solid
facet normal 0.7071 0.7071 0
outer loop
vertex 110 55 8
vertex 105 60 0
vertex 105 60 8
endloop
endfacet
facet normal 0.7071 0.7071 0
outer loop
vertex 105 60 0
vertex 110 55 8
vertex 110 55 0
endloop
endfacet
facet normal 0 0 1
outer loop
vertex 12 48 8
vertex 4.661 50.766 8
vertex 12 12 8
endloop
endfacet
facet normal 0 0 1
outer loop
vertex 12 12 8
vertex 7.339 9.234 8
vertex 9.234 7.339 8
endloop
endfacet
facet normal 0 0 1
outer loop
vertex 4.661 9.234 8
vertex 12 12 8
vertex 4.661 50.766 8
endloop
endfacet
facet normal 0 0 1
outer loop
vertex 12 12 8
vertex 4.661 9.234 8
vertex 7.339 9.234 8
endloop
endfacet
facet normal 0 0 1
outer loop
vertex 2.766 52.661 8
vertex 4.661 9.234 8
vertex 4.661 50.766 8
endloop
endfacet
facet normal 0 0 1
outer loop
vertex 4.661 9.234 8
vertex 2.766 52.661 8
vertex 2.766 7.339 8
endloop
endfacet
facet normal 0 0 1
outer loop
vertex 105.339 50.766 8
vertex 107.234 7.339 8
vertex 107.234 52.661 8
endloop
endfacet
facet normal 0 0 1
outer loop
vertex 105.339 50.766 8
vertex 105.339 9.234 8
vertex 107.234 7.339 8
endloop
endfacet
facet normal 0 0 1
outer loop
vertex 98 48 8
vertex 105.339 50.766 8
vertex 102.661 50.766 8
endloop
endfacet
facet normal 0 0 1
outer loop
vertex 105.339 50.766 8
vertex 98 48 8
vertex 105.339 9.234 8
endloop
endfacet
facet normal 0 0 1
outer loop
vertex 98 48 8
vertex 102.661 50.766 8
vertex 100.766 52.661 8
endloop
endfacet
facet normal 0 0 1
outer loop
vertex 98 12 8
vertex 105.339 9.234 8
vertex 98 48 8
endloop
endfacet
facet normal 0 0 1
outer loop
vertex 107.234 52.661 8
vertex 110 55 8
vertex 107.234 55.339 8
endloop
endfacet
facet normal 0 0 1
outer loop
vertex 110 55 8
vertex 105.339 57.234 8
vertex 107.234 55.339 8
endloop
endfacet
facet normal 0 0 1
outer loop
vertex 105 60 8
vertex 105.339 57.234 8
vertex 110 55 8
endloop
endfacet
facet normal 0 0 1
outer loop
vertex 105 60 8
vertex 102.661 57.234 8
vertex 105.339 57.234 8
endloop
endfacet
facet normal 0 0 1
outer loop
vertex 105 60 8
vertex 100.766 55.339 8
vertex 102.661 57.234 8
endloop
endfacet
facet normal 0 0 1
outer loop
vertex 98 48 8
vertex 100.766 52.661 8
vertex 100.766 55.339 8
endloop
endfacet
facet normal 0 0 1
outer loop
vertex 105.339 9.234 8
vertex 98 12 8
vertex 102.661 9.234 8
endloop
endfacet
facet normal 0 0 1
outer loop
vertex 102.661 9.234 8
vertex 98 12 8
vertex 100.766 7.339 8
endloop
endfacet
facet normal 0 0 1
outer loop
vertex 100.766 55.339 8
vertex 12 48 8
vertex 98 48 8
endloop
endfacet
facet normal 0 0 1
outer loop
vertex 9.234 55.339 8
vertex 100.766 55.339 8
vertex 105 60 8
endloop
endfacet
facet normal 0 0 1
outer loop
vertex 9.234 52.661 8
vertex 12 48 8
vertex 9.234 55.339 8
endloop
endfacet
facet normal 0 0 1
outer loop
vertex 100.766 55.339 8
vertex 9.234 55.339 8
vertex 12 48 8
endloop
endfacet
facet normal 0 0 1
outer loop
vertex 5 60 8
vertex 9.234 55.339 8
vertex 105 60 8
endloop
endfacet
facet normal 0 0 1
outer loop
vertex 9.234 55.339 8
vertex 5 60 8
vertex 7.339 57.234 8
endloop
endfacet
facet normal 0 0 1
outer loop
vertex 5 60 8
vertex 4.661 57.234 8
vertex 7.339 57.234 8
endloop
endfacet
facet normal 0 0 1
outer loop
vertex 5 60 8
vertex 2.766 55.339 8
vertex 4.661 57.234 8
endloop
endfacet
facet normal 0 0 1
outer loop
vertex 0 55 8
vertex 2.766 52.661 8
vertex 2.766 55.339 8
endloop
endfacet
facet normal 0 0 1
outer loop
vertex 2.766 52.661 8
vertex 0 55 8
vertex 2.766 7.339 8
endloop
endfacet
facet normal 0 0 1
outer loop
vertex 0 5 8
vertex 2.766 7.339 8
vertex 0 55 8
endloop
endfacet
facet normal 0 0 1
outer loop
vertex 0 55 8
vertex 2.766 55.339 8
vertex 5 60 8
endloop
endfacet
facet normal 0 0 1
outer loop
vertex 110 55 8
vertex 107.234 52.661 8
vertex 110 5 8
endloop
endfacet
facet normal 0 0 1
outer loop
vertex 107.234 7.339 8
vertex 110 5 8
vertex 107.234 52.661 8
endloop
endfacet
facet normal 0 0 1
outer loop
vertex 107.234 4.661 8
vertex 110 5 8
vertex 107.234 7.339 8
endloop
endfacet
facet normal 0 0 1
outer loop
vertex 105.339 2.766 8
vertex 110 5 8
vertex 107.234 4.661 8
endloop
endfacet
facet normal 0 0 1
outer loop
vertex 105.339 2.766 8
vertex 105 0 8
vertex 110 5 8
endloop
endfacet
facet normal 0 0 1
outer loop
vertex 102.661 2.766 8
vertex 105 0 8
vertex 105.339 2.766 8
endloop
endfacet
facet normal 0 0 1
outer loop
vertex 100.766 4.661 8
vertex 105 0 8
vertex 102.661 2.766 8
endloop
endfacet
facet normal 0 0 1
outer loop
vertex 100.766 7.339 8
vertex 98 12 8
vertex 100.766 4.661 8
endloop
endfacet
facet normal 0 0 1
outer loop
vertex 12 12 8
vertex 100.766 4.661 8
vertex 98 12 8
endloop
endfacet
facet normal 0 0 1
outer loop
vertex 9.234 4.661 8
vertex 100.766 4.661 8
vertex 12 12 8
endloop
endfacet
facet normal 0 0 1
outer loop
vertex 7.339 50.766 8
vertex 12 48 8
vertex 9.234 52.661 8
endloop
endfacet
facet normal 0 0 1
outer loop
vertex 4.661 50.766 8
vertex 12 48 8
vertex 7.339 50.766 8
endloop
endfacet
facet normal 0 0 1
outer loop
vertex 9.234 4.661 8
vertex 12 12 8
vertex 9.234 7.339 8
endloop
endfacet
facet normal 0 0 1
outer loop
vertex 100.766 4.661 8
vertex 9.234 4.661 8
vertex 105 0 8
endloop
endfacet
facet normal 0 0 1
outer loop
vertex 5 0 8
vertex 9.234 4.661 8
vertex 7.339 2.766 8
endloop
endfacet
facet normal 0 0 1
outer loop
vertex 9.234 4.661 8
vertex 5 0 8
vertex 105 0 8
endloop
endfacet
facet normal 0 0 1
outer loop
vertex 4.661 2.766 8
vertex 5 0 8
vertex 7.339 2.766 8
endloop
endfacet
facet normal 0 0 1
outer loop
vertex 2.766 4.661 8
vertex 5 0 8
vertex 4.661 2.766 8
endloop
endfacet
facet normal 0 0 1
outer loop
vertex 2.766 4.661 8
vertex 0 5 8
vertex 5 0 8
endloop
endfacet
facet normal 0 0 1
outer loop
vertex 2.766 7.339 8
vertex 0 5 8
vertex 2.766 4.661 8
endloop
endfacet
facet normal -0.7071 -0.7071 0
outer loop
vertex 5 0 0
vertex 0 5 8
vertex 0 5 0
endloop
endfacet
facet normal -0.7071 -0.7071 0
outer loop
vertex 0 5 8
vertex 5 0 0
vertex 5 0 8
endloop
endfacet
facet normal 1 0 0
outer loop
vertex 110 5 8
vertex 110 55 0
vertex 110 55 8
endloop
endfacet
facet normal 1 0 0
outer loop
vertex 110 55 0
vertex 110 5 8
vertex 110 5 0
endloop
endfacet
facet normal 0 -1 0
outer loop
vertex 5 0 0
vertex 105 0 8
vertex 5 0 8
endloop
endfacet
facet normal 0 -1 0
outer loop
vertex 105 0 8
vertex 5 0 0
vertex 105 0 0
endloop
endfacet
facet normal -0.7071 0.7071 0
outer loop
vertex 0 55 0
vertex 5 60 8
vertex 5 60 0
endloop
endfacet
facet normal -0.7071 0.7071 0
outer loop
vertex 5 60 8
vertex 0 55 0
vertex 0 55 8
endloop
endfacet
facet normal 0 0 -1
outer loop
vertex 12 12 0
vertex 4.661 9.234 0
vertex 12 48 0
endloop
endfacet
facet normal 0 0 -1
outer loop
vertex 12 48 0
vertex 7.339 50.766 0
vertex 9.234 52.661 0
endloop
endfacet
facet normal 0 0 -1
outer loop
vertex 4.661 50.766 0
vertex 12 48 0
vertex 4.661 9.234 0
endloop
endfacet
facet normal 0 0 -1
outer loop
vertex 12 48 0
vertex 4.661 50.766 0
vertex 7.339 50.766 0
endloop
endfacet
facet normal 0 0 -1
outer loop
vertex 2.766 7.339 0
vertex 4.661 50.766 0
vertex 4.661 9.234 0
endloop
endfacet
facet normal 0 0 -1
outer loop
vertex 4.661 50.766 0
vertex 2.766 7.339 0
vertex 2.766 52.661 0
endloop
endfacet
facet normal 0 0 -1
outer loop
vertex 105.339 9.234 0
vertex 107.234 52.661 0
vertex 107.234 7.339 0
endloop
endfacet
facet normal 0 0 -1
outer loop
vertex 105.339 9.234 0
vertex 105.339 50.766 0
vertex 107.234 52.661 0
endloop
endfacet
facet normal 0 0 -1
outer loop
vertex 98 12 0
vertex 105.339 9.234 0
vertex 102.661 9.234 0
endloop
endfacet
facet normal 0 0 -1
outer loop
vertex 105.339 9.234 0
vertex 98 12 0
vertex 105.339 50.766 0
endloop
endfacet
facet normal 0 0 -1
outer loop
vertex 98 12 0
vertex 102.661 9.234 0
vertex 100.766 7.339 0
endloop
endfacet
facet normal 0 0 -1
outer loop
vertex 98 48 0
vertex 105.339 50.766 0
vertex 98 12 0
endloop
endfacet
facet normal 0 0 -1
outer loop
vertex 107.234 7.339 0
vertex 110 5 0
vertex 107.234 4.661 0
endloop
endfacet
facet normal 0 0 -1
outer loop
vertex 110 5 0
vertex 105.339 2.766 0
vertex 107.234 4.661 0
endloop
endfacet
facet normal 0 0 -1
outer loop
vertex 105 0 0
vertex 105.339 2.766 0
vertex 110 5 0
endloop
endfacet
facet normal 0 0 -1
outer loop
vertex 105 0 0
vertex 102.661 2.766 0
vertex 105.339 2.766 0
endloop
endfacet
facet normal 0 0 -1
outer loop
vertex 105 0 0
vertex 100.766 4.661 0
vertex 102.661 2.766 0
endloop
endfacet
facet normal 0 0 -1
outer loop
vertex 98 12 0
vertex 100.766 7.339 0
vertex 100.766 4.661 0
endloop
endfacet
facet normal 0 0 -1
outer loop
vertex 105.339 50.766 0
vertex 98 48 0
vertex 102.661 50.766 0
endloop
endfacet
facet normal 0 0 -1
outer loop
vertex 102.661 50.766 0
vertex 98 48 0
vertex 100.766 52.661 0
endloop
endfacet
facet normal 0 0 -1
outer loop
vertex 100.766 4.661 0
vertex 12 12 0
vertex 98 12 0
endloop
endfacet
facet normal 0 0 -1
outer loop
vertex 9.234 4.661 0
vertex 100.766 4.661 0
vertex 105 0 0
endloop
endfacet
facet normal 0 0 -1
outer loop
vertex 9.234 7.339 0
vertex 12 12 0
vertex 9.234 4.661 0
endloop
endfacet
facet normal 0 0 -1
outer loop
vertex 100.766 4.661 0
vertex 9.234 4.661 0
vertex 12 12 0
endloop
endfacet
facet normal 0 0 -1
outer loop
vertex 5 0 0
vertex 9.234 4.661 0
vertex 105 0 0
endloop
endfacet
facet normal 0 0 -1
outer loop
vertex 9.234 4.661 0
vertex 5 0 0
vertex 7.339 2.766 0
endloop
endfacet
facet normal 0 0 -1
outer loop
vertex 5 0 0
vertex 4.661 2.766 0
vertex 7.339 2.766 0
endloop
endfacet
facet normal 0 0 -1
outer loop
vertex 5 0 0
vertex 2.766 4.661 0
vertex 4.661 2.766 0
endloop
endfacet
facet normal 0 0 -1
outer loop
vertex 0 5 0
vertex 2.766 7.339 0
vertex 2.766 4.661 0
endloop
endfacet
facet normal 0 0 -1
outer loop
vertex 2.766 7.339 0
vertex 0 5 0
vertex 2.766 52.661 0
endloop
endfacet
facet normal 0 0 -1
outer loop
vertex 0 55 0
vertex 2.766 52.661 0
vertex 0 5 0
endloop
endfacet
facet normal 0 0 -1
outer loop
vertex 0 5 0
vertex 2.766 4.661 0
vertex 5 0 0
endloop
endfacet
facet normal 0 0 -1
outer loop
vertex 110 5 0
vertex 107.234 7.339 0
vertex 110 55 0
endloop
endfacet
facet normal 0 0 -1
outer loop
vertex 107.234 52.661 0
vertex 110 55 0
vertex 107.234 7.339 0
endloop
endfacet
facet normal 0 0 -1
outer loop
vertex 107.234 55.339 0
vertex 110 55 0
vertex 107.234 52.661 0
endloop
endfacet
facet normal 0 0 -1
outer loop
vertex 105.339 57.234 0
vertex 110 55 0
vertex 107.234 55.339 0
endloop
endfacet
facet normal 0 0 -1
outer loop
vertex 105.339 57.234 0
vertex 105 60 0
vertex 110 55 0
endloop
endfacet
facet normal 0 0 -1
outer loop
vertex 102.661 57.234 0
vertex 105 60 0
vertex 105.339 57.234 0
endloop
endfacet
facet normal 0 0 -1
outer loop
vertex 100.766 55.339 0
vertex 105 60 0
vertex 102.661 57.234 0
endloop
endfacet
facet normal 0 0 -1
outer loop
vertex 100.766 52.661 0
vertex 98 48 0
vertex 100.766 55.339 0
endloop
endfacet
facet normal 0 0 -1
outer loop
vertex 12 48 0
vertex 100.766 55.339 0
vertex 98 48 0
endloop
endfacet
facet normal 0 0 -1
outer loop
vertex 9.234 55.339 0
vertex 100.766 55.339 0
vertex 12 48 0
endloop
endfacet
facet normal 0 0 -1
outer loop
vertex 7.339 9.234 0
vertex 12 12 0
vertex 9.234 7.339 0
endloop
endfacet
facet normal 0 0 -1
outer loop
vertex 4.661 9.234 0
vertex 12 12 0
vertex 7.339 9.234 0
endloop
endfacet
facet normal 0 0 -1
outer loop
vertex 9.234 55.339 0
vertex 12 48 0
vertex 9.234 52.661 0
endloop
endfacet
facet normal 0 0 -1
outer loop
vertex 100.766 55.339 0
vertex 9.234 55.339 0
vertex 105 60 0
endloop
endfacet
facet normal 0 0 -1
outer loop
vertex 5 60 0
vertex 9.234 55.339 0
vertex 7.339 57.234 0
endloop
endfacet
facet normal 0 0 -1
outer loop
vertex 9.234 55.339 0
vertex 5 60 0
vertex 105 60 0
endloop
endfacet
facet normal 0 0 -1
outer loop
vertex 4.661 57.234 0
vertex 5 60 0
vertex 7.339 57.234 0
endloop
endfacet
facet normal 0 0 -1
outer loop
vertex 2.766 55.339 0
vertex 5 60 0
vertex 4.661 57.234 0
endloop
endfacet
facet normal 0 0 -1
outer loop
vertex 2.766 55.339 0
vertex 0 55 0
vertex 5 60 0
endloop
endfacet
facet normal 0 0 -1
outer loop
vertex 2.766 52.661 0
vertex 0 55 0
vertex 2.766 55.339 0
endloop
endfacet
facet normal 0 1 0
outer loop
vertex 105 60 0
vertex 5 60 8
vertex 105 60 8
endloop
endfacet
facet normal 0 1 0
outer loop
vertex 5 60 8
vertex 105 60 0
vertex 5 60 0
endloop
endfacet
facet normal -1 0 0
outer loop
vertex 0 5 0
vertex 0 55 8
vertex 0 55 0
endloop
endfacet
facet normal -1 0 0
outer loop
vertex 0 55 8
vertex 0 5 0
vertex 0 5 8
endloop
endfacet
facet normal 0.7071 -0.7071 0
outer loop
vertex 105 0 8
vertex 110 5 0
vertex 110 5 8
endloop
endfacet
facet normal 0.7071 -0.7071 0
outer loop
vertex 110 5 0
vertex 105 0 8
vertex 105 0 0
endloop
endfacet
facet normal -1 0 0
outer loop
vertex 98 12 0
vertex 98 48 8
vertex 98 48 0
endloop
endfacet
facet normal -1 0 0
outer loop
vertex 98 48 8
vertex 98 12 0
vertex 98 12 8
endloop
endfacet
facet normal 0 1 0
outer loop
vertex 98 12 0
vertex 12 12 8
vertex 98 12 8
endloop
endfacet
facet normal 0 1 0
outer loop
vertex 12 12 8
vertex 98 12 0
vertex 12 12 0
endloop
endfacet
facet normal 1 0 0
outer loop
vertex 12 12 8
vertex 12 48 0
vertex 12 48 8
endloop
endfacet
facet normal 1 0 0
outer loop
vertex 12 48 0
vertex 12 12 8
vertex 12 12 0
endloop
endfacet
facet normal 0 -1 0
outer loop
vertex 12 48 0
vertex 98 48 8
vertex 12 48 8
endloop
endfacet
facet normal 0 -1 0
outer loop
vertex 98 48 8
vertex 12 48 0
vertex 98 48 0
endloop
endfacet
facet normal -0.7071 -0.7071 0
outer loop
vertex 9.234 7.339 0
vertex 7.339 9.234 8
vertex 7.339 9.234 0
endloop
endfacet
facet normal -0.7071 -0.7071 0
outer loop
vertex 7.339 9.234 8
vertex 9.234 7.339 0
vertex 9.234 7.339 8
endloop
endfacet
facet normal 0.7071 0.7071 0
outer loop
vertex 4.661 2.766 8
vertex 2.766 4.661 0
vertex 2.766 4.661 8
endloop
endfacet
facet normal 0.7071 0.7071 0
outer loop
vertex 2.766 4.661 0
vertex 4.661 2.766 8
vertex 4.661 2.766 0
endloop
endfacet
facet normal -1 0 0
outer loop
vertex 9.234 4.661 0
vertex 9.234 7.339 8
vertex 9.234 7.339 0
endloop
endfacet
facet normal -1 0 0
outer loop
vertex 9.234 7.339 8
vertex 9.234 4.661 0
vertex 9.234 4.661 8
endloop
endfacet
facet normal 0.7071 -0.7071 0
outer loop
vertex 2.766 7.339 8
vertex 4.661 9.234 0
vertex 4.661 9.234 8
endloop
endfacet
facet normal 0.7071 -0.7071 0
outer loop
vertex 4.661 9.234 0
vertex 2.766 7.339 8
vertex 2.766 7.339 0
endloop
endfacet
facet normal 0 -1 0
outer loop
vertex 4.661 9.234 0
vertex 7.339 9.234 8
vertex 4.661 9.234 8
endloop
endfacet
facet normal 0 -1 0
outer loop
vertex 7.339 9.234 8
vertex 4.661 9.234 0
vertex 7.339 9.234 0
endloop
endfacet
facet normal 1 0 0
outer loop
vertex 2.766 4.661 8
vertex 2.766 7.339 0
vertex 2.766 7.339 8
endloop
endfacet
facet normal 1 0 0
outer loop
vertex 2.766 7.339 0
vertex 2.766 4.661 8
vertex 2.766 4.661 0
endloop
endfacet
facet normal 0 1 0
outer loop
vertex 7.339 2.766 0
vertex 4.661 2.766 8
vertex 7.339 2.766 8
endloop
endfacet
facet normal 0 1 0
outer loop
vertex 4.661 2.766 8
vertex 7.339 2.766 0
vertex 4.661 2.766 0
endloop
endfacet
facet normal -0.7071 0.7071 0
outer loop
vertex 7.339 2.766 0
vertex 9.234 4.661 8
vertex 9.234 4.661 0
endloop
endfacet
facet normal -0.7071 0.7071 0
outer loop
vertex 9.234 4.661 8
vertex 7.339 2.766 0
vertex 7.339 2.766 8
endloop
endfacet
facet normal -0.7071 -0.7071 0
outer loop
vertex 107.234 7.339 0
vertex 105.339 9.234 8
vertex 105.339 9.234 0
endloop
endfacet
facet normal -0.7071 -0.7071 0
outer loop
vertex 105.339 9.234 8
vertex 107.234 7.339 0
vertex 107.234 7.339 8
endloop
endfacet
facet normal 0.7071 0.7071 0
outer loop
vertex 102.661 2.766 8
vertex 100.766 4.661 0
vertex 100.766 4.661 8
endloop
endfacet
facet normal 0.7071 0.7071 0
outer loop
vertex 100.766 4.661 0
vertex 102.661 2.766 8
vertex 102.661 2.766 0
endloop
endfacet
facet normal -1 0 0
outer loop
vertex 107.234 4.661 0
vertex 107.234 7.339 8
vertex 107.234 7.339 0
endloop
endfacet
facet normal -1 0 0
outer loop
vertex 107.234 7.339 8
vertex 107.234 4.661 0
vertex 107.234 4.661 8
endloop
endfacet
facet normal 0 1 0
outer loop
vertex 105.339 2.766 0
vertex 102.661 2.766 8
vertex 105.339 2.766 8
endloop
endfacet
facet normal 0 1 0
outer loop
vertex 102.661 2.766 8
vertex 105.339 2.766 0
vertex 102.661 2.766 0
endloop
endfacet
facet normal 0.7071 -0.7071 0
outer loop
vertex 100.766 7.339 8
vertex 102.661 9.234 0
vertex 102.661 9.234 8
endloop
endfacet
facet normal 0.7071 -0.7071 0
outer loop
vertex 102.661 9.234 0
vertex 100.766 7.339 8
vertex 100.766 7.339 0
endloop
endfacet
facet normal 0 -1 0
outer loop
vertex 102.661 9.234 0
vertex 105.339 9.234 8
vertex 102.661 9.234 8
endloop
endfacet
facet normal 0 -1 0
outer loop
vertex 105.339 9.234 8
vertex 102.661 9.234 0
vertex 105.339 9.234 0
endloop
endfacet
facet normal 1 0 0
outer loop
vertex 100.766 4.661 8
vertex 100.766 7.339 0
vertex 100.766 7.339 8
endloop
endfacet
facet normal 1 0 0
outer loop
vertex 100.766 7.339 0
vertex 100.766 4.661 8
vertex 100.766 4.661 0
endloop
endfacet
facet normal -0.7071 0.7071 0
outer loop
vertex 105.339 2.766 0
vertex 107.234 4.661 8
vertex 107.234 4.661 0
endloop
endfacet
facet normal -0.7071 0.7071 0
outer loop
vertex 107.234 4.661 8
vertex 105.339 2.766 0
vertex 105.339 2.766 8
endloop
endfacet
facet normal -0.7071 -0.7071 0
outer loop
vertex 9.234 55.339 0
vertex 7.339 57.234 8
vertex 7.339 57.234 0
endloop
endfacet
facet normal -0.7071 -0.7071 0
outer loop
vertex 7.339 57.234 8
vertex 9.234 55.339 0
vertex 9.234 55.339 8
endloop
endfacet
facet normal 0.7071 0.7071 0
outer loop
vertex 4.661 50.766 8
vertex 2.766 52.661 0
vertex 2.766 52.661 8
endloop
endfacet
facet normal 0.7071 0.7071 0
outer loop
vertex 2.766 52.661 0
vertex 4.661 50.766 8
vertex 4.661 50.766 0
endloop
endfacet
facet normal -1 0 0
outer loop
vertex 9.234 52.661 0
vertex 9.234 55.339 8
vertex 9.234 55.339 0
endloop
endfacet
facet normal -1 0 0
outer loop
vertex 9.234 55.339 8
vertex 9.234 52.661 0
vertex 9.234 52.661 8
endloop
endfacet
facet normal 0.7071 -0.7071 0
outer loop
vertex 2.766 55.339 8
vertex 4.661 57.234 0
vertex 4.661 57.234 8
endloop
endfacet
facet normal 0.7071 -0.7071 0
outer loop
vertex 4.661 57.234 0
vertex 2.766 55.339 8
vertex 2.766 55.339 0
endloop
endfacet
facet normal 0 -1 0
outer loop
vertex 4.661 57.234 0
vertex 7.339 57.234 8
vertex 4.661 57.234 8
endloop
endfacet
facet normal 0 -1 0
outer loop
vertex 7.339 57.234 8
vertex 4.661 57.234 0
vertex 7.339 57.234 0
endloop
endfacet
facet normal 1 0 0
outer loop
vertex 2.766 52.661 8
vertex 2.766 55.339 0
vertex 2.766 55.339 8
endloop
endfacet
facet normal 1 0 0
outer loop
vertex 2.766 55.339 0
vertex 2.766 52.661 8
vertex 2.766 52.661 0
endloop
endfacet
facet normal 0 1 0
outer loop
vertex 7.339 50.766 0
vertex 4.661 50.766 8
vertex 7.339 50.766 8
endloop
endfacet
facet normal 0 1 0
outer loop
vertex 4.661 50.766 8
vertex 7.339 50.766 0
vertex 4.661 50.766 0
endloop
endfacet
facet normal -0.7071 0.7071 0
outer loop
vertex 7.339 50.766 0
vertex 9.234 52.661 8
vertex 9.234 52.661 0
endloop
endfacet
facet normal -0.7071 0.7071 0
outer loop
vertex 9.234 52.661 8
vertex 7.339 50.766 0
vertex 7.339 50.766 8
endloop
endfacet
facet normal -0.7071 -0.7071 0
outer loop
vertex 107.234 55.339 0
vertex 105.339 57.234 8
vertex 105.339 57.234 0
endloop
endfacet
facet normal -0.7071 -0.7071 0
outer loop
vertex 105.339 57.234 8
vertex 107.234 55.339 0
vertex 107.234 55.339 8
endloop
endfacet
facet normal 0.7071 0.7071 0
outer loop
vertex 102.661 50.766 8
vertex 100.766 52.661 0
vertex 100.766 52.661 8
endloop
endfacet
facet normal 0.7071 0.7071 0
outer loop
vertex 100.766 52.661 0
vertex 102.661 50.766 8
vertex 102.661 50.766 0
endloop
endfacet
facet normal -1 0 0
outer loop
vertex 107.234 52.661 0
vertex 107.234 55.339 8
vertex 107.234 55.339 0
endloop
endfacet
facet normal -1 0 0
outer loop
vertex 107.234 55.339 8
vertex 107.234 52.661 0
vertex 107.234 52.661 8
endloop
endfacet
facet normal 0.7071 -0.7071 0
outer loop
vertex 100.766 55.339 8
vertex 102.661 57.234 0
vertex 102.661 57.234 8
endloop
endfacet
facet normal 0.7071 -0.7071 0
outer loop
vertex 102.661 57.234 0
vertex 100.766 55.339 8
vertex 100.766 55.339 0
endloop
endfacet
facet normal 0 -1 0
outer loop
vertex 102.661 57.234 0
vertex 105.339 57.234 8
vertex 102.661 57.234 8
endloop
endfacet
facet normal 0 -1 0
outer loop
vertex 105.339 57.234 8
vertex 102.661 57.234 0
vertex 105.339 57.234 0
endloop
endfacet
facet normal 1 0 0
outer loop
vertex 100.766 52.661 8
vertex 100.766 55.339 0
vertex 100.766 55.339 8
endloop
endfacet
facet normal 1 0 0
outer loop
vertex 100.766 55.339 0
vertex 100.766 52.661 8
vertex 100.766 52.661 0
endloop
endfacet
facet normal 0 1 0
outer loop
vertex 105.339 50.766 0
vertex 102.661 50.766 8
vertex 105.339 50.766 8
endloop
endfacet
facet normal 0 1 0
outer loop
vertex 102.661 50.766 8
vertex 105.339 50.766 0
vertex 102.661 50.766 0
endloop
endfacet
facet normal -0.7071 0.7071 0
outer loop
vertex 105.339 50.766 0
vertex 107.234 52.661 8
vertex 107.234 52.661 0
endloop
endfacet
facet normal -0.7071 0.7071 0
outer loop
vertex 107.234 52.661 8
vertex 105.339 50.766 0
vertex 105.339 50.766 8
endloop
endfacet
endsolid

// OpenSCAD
$fn = 32;

// ----------------------------------------------------------------------
// Frame plate: 110 x 60 frame, 12 mm rails
// ----------------------------------------------------------------------

// --- parameters (mm) ---
plate_l = 110;            // plate length, X
plate_w = 60;             // plate width, Y
plate_t = 8;              // plate thickness, Z (extrusion height)
corner_c = 5;             // corner chamfer
frame_bar = 12;           // frame rail width
bolt_r = 3.5;             // corner bolt window radius
bolt_inset = 6;           // bolt centre inset from the edges

win_l = plate_l - 2 * frame_bar;  // window length
win_w = plate_w - 2 * frame_bar;  // window width
bolt_d = 2 * bolt_r;  // corner hole diameter

profile = [[5, 0], [105, 0], [110, 5], [110, 55], [105, 60], [5, 60], [0, 55], [0, 5]];  // primary outline, 8 points, counter clockwise
void_1 = [[12, 12], [98, 12], [98, 48], [12, 48]];  // the window, 4 points
void_2 = [[9.234, 7.339], [7.339, 9.234], [4.661, 9.234], [2.766, 7.339], [2.766, 4.661], [4.661, 2.766], [7.339, 2.766], [9.234, 4.661]];  // corner bolt window, 8 points
void_3 = [[107.234, 7.339], [105.339, 9.234], [102.661, 9.234], [100.766, 7.339], [100.766, 4.661], [102.661, 2.766], [105.339, 2.766], [107.234, 4.661]];  // corner bolt window, 8 points
void_4 = [[9.234, 55.339], [7.339, 57.234], [4.661, 57.234], [2.766, 55.339], [2.766, 52.661], [4.661, 50.766], [7.339, 50.766], [9.234, 52.661]];  // corner bolt window, 8 points
void_5 = [[107.234, 55.339], [105.339, 57.234], [102.661, 57.234], [100.766, 55.339], [100.766, 52.661], [102.661, 50.766], [105.339, 50.766], [107.234, 52.661]];  // corner bolt window, 8 points

// --- the one profile operation ---
difference() {
  linear_extrude(height = plate_t) polygon(points = profile);
  translate([0, 0, -1])
    linear_extrude(height = plate_t + 2) polygon(points = void_1);
  translate([0, 0, -1])
    linear_extrude(height = plate_t + 2) polygon(points = void_2);
  translate([0, 0, -1])
    linear_extrude(height = plate_t + 2) polygon(points = void_3);
  translate([0, 0, -1])
    linear_extrude(height = plate_t + 2) polygon(points = void_4);
  translate([0, 0, -1])
    linear_extrude(height = plate_t + 2) polygon(points = void_5);
}
